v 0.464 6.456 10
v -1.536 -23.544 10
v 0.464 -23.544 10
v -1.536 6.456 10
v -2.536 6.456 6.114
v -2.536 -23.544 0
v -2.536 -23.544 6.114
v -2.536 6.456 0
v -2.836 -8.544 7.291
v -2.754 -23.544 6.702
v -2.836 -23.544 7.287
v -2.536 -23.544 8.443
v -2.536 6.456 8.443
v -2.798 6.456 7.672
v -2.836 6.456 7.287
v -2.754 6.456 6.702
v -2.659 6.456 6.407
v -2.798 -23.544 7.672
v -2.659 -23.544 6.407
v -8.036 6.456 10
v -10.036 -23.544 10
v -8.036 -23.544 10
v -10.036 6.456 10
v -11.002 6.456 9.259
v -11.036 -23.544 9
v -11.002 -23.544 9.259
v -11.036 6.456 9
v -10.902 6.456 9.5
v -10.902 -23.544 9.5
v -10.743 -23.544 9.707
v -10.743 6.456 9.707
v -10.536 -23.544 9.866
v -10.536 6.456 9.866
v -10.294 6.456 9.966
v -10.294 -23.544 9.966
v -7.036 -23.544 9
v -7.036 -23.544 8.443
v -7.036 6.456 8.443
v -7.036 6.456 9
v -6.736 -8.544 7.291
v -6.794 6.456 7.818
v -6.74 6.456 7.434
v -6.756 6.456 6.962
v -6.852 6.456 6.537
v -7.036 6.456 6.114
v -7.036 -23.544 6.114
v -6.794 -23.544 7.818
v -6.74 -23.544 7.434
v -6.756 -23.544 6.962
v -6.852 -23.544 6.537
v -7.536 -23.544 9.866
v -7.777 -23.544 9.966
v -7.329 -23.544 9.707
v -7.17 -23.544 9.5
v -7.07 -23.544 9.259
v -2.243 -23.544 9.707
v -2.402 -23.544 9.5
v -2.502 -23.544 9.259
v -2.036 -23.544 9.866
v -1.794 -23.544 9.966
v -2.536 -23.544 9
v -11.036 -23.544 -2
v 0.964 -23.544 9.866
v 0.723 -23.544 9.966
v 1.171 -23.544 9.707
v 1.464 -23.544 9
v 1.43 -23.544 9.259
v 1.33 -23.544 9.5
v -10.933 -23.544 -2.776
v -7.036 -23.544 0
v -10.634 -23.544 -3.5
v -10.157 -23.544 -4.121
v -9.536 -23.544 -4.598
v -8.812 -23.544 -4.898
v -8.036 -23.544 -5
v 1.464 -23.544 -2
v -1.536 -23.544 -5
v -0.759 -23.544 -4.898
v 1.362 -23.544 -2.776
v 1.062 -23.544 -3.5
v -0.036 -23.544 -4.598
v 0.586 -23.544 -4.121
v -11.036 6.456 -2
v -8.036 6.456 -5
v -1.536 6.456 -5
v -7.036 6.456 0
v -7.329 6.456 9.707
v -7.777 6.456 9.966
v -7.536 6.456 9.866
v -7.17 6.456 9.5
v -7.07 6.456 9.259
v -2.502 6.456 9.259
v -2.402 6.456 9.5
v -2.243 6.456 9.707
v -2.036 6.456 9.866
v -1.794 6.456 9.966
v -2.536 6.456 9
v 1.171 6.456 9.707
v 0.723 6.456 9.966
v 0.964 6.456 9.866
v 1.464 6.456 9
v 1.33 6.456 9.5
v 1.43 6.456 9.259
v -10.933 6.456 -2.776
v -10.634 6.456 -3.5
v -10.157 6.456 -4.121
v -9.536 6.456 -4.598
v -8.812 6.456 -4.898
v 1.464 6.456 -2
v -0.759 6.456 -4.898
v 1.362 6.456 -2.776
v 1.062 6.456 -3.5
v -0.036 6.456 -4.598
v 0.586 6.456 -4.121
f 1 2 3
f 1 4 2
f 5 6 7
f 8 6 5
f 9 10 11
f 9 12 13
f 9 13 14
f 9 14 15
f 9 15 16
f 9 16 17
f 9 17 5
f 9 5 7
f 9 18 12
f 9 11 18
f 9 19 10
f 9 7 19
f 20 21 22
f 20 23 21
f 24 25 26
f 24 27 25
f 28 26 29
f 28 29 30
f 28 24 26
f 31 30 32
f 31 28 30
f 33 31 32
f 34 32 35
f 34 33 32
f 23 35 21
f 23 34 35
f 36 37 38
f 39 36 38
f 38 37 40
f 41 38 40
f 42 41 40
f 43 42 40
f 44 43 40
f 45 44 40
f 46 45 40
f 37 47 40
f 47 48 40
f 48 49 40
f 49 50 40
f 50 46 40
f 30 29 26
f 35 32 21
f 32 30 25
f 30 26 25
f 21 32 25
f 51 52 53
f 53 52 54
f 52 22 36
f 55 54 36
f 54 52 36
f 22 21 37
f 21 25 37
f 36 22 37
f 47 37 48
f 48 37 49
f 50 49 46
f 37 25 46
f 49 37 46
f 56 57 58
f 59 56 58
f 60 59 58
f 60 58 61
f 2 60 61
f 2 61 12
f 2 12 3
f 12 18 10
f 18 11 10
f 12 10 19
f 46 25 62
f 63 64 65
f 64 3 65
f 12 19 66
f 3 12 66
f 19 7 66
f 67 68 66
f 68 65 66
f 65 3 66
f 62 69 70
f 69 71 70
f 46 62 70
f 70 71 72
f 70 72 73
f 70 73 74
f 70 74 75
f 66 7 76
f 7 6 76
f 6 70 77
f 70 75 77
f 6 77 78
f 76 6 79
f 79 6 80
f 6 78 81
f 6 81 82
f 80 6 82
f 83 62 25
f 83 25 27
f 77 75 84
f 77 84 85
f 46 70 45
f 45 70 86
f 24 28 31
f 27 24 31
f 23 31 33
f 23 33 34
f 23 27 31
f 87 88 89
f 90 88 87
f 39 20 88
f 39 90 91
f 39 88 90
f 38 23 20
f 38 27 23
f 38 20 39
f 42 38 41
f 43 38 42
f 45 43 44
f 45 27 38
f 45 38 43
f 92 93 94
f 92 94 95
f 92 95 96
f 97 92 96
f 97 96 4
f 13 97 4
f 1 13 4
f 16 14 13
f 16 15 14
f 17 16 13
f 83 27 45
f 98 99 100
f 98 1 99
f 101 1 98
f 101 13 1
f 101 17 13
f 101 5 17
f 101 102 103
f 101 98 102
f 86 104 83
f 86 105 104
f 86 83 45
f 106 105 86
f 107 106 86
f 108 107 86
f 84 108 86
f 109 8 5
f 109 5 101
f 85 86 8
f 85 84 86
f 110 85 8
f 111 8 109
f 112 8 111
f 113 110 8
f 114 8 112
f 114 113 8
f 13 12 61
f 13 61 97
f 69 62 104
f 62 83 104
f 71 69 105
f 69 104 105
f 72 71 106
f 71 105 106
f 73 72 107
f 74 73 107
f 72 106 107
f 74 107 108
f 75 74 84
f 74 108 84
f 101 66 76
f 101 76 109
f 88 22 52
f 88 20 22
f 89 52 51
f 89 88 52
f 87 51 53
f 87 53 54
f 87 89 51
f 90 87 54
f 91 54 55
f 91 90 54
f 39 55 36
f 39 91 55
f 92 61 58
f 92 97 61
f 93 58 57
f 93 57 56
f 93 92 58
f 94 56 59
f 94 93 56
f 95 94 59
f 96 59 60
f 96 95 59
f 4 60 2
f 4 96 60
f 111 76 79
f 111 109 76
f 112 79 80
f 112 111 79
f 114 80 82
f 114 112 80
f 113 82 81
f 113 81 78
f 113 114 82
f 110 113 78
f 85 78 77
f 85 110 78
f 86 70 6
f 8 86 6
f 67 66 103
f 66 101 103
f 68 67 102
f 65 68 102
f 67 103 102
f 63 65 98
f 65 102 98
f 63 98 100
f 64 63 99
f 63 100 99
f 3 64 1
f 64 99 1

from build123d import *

# Parameters (mm, degrees)
F0_W     = 4.5
F0_H     = 30
F0_W_2   = 4
F1_DEPTH = 5
F2_DEPTH = 10
F3_R     = 3
F4_R     = 1
F6_DEPTH = 30


with BuildPart() as f1:
    # F0 (on Top) → F1 (new body)
    with BuildSketch(Plane.XY):
        with Locations((-4.7856509686, -8.5439818352)):
            Rectangle(F0_W, F0_H)
        with Locations((-9.0356509686, -8.5439818352)):
            Rectangle(F0_W_2, F0_H)
        with Locations((-0.5356509686, -8.5439818352)):
            Rectangle(F0_W_2, F0_H)
    extrude(amount=-F1_DEPTH)

    # F0 (on Top) → F2 (join)
    with BuildSketch(Plane.XY):
        with Locations((-9.0356509686, -8.5439818352)):
            Rectangle(F0_W_2, F0_H)
        with Locations((-0.5356509686, -8.5439818352)):
            Rectangle(F0_W_2, F0_H)
    extrude(amount=F2_DEPTH)

    # F3
    f3_edges = [f1.edges().sort_by_distance(p)[0] for p in [
        (1.464349, -8.543982, -5),
        (-11.035651, -8.543982, -5),
    ]]
    fillet(f3_edges, radius=F3_R)

    # F4
    f4_edges = [f1.edges().sort_by_distance(p)[0] for p in [
        (-7.035651, -8.543982, 10),
        (-11.035651, -8.543982, 10),
        (1.464349, -8.543982, 10),
        (-2.535651, -8.543982, 10),
    ]]
    fillet(f4_edges, radius=F4_R)

    # F5 (on face) → F6 (join)
    with BuildSketch(Plane.XZ.offset(23.5439818352)):
        with BuildLine():
            Line((-2.5356509686, 6.1144679785), (-2.5356509686, 8.4431599826))
            add(Edge.make_bspline(
                [(-2.5356509686, 8.4431599826), (-2.7152575285, 8.0569054131), (-2.9551929536, 7.2933215725), (-2.7169880221, 6.5044440771), (-2.5356509686, 6.1144679785)],
                knots=[0, 0, 0, 0, 0.49760282, 1, 1, 1, 1], degree=3))
        make_face()
        with BuildLine():
            Line((-7.0356509686, 8.4431599826), (-7.0356509686, 6.1144679785))
            add(Edge.make_bspline(
                [(-7.0356509686, 8.4431599826), (-6.8227021242, 8.0569054131), (-6.6496118928, 7.2933215725), (-6.8206503806, 6.5044440771), (-7.0356509686, 6.1144679785)],
                knots=[0, 0, 0, 0, 0.49760282, 1, 1, 1, 1], degree=3))
        make_face()
    extrude(amount=-F6_DEPTH)


solid = f1.part
